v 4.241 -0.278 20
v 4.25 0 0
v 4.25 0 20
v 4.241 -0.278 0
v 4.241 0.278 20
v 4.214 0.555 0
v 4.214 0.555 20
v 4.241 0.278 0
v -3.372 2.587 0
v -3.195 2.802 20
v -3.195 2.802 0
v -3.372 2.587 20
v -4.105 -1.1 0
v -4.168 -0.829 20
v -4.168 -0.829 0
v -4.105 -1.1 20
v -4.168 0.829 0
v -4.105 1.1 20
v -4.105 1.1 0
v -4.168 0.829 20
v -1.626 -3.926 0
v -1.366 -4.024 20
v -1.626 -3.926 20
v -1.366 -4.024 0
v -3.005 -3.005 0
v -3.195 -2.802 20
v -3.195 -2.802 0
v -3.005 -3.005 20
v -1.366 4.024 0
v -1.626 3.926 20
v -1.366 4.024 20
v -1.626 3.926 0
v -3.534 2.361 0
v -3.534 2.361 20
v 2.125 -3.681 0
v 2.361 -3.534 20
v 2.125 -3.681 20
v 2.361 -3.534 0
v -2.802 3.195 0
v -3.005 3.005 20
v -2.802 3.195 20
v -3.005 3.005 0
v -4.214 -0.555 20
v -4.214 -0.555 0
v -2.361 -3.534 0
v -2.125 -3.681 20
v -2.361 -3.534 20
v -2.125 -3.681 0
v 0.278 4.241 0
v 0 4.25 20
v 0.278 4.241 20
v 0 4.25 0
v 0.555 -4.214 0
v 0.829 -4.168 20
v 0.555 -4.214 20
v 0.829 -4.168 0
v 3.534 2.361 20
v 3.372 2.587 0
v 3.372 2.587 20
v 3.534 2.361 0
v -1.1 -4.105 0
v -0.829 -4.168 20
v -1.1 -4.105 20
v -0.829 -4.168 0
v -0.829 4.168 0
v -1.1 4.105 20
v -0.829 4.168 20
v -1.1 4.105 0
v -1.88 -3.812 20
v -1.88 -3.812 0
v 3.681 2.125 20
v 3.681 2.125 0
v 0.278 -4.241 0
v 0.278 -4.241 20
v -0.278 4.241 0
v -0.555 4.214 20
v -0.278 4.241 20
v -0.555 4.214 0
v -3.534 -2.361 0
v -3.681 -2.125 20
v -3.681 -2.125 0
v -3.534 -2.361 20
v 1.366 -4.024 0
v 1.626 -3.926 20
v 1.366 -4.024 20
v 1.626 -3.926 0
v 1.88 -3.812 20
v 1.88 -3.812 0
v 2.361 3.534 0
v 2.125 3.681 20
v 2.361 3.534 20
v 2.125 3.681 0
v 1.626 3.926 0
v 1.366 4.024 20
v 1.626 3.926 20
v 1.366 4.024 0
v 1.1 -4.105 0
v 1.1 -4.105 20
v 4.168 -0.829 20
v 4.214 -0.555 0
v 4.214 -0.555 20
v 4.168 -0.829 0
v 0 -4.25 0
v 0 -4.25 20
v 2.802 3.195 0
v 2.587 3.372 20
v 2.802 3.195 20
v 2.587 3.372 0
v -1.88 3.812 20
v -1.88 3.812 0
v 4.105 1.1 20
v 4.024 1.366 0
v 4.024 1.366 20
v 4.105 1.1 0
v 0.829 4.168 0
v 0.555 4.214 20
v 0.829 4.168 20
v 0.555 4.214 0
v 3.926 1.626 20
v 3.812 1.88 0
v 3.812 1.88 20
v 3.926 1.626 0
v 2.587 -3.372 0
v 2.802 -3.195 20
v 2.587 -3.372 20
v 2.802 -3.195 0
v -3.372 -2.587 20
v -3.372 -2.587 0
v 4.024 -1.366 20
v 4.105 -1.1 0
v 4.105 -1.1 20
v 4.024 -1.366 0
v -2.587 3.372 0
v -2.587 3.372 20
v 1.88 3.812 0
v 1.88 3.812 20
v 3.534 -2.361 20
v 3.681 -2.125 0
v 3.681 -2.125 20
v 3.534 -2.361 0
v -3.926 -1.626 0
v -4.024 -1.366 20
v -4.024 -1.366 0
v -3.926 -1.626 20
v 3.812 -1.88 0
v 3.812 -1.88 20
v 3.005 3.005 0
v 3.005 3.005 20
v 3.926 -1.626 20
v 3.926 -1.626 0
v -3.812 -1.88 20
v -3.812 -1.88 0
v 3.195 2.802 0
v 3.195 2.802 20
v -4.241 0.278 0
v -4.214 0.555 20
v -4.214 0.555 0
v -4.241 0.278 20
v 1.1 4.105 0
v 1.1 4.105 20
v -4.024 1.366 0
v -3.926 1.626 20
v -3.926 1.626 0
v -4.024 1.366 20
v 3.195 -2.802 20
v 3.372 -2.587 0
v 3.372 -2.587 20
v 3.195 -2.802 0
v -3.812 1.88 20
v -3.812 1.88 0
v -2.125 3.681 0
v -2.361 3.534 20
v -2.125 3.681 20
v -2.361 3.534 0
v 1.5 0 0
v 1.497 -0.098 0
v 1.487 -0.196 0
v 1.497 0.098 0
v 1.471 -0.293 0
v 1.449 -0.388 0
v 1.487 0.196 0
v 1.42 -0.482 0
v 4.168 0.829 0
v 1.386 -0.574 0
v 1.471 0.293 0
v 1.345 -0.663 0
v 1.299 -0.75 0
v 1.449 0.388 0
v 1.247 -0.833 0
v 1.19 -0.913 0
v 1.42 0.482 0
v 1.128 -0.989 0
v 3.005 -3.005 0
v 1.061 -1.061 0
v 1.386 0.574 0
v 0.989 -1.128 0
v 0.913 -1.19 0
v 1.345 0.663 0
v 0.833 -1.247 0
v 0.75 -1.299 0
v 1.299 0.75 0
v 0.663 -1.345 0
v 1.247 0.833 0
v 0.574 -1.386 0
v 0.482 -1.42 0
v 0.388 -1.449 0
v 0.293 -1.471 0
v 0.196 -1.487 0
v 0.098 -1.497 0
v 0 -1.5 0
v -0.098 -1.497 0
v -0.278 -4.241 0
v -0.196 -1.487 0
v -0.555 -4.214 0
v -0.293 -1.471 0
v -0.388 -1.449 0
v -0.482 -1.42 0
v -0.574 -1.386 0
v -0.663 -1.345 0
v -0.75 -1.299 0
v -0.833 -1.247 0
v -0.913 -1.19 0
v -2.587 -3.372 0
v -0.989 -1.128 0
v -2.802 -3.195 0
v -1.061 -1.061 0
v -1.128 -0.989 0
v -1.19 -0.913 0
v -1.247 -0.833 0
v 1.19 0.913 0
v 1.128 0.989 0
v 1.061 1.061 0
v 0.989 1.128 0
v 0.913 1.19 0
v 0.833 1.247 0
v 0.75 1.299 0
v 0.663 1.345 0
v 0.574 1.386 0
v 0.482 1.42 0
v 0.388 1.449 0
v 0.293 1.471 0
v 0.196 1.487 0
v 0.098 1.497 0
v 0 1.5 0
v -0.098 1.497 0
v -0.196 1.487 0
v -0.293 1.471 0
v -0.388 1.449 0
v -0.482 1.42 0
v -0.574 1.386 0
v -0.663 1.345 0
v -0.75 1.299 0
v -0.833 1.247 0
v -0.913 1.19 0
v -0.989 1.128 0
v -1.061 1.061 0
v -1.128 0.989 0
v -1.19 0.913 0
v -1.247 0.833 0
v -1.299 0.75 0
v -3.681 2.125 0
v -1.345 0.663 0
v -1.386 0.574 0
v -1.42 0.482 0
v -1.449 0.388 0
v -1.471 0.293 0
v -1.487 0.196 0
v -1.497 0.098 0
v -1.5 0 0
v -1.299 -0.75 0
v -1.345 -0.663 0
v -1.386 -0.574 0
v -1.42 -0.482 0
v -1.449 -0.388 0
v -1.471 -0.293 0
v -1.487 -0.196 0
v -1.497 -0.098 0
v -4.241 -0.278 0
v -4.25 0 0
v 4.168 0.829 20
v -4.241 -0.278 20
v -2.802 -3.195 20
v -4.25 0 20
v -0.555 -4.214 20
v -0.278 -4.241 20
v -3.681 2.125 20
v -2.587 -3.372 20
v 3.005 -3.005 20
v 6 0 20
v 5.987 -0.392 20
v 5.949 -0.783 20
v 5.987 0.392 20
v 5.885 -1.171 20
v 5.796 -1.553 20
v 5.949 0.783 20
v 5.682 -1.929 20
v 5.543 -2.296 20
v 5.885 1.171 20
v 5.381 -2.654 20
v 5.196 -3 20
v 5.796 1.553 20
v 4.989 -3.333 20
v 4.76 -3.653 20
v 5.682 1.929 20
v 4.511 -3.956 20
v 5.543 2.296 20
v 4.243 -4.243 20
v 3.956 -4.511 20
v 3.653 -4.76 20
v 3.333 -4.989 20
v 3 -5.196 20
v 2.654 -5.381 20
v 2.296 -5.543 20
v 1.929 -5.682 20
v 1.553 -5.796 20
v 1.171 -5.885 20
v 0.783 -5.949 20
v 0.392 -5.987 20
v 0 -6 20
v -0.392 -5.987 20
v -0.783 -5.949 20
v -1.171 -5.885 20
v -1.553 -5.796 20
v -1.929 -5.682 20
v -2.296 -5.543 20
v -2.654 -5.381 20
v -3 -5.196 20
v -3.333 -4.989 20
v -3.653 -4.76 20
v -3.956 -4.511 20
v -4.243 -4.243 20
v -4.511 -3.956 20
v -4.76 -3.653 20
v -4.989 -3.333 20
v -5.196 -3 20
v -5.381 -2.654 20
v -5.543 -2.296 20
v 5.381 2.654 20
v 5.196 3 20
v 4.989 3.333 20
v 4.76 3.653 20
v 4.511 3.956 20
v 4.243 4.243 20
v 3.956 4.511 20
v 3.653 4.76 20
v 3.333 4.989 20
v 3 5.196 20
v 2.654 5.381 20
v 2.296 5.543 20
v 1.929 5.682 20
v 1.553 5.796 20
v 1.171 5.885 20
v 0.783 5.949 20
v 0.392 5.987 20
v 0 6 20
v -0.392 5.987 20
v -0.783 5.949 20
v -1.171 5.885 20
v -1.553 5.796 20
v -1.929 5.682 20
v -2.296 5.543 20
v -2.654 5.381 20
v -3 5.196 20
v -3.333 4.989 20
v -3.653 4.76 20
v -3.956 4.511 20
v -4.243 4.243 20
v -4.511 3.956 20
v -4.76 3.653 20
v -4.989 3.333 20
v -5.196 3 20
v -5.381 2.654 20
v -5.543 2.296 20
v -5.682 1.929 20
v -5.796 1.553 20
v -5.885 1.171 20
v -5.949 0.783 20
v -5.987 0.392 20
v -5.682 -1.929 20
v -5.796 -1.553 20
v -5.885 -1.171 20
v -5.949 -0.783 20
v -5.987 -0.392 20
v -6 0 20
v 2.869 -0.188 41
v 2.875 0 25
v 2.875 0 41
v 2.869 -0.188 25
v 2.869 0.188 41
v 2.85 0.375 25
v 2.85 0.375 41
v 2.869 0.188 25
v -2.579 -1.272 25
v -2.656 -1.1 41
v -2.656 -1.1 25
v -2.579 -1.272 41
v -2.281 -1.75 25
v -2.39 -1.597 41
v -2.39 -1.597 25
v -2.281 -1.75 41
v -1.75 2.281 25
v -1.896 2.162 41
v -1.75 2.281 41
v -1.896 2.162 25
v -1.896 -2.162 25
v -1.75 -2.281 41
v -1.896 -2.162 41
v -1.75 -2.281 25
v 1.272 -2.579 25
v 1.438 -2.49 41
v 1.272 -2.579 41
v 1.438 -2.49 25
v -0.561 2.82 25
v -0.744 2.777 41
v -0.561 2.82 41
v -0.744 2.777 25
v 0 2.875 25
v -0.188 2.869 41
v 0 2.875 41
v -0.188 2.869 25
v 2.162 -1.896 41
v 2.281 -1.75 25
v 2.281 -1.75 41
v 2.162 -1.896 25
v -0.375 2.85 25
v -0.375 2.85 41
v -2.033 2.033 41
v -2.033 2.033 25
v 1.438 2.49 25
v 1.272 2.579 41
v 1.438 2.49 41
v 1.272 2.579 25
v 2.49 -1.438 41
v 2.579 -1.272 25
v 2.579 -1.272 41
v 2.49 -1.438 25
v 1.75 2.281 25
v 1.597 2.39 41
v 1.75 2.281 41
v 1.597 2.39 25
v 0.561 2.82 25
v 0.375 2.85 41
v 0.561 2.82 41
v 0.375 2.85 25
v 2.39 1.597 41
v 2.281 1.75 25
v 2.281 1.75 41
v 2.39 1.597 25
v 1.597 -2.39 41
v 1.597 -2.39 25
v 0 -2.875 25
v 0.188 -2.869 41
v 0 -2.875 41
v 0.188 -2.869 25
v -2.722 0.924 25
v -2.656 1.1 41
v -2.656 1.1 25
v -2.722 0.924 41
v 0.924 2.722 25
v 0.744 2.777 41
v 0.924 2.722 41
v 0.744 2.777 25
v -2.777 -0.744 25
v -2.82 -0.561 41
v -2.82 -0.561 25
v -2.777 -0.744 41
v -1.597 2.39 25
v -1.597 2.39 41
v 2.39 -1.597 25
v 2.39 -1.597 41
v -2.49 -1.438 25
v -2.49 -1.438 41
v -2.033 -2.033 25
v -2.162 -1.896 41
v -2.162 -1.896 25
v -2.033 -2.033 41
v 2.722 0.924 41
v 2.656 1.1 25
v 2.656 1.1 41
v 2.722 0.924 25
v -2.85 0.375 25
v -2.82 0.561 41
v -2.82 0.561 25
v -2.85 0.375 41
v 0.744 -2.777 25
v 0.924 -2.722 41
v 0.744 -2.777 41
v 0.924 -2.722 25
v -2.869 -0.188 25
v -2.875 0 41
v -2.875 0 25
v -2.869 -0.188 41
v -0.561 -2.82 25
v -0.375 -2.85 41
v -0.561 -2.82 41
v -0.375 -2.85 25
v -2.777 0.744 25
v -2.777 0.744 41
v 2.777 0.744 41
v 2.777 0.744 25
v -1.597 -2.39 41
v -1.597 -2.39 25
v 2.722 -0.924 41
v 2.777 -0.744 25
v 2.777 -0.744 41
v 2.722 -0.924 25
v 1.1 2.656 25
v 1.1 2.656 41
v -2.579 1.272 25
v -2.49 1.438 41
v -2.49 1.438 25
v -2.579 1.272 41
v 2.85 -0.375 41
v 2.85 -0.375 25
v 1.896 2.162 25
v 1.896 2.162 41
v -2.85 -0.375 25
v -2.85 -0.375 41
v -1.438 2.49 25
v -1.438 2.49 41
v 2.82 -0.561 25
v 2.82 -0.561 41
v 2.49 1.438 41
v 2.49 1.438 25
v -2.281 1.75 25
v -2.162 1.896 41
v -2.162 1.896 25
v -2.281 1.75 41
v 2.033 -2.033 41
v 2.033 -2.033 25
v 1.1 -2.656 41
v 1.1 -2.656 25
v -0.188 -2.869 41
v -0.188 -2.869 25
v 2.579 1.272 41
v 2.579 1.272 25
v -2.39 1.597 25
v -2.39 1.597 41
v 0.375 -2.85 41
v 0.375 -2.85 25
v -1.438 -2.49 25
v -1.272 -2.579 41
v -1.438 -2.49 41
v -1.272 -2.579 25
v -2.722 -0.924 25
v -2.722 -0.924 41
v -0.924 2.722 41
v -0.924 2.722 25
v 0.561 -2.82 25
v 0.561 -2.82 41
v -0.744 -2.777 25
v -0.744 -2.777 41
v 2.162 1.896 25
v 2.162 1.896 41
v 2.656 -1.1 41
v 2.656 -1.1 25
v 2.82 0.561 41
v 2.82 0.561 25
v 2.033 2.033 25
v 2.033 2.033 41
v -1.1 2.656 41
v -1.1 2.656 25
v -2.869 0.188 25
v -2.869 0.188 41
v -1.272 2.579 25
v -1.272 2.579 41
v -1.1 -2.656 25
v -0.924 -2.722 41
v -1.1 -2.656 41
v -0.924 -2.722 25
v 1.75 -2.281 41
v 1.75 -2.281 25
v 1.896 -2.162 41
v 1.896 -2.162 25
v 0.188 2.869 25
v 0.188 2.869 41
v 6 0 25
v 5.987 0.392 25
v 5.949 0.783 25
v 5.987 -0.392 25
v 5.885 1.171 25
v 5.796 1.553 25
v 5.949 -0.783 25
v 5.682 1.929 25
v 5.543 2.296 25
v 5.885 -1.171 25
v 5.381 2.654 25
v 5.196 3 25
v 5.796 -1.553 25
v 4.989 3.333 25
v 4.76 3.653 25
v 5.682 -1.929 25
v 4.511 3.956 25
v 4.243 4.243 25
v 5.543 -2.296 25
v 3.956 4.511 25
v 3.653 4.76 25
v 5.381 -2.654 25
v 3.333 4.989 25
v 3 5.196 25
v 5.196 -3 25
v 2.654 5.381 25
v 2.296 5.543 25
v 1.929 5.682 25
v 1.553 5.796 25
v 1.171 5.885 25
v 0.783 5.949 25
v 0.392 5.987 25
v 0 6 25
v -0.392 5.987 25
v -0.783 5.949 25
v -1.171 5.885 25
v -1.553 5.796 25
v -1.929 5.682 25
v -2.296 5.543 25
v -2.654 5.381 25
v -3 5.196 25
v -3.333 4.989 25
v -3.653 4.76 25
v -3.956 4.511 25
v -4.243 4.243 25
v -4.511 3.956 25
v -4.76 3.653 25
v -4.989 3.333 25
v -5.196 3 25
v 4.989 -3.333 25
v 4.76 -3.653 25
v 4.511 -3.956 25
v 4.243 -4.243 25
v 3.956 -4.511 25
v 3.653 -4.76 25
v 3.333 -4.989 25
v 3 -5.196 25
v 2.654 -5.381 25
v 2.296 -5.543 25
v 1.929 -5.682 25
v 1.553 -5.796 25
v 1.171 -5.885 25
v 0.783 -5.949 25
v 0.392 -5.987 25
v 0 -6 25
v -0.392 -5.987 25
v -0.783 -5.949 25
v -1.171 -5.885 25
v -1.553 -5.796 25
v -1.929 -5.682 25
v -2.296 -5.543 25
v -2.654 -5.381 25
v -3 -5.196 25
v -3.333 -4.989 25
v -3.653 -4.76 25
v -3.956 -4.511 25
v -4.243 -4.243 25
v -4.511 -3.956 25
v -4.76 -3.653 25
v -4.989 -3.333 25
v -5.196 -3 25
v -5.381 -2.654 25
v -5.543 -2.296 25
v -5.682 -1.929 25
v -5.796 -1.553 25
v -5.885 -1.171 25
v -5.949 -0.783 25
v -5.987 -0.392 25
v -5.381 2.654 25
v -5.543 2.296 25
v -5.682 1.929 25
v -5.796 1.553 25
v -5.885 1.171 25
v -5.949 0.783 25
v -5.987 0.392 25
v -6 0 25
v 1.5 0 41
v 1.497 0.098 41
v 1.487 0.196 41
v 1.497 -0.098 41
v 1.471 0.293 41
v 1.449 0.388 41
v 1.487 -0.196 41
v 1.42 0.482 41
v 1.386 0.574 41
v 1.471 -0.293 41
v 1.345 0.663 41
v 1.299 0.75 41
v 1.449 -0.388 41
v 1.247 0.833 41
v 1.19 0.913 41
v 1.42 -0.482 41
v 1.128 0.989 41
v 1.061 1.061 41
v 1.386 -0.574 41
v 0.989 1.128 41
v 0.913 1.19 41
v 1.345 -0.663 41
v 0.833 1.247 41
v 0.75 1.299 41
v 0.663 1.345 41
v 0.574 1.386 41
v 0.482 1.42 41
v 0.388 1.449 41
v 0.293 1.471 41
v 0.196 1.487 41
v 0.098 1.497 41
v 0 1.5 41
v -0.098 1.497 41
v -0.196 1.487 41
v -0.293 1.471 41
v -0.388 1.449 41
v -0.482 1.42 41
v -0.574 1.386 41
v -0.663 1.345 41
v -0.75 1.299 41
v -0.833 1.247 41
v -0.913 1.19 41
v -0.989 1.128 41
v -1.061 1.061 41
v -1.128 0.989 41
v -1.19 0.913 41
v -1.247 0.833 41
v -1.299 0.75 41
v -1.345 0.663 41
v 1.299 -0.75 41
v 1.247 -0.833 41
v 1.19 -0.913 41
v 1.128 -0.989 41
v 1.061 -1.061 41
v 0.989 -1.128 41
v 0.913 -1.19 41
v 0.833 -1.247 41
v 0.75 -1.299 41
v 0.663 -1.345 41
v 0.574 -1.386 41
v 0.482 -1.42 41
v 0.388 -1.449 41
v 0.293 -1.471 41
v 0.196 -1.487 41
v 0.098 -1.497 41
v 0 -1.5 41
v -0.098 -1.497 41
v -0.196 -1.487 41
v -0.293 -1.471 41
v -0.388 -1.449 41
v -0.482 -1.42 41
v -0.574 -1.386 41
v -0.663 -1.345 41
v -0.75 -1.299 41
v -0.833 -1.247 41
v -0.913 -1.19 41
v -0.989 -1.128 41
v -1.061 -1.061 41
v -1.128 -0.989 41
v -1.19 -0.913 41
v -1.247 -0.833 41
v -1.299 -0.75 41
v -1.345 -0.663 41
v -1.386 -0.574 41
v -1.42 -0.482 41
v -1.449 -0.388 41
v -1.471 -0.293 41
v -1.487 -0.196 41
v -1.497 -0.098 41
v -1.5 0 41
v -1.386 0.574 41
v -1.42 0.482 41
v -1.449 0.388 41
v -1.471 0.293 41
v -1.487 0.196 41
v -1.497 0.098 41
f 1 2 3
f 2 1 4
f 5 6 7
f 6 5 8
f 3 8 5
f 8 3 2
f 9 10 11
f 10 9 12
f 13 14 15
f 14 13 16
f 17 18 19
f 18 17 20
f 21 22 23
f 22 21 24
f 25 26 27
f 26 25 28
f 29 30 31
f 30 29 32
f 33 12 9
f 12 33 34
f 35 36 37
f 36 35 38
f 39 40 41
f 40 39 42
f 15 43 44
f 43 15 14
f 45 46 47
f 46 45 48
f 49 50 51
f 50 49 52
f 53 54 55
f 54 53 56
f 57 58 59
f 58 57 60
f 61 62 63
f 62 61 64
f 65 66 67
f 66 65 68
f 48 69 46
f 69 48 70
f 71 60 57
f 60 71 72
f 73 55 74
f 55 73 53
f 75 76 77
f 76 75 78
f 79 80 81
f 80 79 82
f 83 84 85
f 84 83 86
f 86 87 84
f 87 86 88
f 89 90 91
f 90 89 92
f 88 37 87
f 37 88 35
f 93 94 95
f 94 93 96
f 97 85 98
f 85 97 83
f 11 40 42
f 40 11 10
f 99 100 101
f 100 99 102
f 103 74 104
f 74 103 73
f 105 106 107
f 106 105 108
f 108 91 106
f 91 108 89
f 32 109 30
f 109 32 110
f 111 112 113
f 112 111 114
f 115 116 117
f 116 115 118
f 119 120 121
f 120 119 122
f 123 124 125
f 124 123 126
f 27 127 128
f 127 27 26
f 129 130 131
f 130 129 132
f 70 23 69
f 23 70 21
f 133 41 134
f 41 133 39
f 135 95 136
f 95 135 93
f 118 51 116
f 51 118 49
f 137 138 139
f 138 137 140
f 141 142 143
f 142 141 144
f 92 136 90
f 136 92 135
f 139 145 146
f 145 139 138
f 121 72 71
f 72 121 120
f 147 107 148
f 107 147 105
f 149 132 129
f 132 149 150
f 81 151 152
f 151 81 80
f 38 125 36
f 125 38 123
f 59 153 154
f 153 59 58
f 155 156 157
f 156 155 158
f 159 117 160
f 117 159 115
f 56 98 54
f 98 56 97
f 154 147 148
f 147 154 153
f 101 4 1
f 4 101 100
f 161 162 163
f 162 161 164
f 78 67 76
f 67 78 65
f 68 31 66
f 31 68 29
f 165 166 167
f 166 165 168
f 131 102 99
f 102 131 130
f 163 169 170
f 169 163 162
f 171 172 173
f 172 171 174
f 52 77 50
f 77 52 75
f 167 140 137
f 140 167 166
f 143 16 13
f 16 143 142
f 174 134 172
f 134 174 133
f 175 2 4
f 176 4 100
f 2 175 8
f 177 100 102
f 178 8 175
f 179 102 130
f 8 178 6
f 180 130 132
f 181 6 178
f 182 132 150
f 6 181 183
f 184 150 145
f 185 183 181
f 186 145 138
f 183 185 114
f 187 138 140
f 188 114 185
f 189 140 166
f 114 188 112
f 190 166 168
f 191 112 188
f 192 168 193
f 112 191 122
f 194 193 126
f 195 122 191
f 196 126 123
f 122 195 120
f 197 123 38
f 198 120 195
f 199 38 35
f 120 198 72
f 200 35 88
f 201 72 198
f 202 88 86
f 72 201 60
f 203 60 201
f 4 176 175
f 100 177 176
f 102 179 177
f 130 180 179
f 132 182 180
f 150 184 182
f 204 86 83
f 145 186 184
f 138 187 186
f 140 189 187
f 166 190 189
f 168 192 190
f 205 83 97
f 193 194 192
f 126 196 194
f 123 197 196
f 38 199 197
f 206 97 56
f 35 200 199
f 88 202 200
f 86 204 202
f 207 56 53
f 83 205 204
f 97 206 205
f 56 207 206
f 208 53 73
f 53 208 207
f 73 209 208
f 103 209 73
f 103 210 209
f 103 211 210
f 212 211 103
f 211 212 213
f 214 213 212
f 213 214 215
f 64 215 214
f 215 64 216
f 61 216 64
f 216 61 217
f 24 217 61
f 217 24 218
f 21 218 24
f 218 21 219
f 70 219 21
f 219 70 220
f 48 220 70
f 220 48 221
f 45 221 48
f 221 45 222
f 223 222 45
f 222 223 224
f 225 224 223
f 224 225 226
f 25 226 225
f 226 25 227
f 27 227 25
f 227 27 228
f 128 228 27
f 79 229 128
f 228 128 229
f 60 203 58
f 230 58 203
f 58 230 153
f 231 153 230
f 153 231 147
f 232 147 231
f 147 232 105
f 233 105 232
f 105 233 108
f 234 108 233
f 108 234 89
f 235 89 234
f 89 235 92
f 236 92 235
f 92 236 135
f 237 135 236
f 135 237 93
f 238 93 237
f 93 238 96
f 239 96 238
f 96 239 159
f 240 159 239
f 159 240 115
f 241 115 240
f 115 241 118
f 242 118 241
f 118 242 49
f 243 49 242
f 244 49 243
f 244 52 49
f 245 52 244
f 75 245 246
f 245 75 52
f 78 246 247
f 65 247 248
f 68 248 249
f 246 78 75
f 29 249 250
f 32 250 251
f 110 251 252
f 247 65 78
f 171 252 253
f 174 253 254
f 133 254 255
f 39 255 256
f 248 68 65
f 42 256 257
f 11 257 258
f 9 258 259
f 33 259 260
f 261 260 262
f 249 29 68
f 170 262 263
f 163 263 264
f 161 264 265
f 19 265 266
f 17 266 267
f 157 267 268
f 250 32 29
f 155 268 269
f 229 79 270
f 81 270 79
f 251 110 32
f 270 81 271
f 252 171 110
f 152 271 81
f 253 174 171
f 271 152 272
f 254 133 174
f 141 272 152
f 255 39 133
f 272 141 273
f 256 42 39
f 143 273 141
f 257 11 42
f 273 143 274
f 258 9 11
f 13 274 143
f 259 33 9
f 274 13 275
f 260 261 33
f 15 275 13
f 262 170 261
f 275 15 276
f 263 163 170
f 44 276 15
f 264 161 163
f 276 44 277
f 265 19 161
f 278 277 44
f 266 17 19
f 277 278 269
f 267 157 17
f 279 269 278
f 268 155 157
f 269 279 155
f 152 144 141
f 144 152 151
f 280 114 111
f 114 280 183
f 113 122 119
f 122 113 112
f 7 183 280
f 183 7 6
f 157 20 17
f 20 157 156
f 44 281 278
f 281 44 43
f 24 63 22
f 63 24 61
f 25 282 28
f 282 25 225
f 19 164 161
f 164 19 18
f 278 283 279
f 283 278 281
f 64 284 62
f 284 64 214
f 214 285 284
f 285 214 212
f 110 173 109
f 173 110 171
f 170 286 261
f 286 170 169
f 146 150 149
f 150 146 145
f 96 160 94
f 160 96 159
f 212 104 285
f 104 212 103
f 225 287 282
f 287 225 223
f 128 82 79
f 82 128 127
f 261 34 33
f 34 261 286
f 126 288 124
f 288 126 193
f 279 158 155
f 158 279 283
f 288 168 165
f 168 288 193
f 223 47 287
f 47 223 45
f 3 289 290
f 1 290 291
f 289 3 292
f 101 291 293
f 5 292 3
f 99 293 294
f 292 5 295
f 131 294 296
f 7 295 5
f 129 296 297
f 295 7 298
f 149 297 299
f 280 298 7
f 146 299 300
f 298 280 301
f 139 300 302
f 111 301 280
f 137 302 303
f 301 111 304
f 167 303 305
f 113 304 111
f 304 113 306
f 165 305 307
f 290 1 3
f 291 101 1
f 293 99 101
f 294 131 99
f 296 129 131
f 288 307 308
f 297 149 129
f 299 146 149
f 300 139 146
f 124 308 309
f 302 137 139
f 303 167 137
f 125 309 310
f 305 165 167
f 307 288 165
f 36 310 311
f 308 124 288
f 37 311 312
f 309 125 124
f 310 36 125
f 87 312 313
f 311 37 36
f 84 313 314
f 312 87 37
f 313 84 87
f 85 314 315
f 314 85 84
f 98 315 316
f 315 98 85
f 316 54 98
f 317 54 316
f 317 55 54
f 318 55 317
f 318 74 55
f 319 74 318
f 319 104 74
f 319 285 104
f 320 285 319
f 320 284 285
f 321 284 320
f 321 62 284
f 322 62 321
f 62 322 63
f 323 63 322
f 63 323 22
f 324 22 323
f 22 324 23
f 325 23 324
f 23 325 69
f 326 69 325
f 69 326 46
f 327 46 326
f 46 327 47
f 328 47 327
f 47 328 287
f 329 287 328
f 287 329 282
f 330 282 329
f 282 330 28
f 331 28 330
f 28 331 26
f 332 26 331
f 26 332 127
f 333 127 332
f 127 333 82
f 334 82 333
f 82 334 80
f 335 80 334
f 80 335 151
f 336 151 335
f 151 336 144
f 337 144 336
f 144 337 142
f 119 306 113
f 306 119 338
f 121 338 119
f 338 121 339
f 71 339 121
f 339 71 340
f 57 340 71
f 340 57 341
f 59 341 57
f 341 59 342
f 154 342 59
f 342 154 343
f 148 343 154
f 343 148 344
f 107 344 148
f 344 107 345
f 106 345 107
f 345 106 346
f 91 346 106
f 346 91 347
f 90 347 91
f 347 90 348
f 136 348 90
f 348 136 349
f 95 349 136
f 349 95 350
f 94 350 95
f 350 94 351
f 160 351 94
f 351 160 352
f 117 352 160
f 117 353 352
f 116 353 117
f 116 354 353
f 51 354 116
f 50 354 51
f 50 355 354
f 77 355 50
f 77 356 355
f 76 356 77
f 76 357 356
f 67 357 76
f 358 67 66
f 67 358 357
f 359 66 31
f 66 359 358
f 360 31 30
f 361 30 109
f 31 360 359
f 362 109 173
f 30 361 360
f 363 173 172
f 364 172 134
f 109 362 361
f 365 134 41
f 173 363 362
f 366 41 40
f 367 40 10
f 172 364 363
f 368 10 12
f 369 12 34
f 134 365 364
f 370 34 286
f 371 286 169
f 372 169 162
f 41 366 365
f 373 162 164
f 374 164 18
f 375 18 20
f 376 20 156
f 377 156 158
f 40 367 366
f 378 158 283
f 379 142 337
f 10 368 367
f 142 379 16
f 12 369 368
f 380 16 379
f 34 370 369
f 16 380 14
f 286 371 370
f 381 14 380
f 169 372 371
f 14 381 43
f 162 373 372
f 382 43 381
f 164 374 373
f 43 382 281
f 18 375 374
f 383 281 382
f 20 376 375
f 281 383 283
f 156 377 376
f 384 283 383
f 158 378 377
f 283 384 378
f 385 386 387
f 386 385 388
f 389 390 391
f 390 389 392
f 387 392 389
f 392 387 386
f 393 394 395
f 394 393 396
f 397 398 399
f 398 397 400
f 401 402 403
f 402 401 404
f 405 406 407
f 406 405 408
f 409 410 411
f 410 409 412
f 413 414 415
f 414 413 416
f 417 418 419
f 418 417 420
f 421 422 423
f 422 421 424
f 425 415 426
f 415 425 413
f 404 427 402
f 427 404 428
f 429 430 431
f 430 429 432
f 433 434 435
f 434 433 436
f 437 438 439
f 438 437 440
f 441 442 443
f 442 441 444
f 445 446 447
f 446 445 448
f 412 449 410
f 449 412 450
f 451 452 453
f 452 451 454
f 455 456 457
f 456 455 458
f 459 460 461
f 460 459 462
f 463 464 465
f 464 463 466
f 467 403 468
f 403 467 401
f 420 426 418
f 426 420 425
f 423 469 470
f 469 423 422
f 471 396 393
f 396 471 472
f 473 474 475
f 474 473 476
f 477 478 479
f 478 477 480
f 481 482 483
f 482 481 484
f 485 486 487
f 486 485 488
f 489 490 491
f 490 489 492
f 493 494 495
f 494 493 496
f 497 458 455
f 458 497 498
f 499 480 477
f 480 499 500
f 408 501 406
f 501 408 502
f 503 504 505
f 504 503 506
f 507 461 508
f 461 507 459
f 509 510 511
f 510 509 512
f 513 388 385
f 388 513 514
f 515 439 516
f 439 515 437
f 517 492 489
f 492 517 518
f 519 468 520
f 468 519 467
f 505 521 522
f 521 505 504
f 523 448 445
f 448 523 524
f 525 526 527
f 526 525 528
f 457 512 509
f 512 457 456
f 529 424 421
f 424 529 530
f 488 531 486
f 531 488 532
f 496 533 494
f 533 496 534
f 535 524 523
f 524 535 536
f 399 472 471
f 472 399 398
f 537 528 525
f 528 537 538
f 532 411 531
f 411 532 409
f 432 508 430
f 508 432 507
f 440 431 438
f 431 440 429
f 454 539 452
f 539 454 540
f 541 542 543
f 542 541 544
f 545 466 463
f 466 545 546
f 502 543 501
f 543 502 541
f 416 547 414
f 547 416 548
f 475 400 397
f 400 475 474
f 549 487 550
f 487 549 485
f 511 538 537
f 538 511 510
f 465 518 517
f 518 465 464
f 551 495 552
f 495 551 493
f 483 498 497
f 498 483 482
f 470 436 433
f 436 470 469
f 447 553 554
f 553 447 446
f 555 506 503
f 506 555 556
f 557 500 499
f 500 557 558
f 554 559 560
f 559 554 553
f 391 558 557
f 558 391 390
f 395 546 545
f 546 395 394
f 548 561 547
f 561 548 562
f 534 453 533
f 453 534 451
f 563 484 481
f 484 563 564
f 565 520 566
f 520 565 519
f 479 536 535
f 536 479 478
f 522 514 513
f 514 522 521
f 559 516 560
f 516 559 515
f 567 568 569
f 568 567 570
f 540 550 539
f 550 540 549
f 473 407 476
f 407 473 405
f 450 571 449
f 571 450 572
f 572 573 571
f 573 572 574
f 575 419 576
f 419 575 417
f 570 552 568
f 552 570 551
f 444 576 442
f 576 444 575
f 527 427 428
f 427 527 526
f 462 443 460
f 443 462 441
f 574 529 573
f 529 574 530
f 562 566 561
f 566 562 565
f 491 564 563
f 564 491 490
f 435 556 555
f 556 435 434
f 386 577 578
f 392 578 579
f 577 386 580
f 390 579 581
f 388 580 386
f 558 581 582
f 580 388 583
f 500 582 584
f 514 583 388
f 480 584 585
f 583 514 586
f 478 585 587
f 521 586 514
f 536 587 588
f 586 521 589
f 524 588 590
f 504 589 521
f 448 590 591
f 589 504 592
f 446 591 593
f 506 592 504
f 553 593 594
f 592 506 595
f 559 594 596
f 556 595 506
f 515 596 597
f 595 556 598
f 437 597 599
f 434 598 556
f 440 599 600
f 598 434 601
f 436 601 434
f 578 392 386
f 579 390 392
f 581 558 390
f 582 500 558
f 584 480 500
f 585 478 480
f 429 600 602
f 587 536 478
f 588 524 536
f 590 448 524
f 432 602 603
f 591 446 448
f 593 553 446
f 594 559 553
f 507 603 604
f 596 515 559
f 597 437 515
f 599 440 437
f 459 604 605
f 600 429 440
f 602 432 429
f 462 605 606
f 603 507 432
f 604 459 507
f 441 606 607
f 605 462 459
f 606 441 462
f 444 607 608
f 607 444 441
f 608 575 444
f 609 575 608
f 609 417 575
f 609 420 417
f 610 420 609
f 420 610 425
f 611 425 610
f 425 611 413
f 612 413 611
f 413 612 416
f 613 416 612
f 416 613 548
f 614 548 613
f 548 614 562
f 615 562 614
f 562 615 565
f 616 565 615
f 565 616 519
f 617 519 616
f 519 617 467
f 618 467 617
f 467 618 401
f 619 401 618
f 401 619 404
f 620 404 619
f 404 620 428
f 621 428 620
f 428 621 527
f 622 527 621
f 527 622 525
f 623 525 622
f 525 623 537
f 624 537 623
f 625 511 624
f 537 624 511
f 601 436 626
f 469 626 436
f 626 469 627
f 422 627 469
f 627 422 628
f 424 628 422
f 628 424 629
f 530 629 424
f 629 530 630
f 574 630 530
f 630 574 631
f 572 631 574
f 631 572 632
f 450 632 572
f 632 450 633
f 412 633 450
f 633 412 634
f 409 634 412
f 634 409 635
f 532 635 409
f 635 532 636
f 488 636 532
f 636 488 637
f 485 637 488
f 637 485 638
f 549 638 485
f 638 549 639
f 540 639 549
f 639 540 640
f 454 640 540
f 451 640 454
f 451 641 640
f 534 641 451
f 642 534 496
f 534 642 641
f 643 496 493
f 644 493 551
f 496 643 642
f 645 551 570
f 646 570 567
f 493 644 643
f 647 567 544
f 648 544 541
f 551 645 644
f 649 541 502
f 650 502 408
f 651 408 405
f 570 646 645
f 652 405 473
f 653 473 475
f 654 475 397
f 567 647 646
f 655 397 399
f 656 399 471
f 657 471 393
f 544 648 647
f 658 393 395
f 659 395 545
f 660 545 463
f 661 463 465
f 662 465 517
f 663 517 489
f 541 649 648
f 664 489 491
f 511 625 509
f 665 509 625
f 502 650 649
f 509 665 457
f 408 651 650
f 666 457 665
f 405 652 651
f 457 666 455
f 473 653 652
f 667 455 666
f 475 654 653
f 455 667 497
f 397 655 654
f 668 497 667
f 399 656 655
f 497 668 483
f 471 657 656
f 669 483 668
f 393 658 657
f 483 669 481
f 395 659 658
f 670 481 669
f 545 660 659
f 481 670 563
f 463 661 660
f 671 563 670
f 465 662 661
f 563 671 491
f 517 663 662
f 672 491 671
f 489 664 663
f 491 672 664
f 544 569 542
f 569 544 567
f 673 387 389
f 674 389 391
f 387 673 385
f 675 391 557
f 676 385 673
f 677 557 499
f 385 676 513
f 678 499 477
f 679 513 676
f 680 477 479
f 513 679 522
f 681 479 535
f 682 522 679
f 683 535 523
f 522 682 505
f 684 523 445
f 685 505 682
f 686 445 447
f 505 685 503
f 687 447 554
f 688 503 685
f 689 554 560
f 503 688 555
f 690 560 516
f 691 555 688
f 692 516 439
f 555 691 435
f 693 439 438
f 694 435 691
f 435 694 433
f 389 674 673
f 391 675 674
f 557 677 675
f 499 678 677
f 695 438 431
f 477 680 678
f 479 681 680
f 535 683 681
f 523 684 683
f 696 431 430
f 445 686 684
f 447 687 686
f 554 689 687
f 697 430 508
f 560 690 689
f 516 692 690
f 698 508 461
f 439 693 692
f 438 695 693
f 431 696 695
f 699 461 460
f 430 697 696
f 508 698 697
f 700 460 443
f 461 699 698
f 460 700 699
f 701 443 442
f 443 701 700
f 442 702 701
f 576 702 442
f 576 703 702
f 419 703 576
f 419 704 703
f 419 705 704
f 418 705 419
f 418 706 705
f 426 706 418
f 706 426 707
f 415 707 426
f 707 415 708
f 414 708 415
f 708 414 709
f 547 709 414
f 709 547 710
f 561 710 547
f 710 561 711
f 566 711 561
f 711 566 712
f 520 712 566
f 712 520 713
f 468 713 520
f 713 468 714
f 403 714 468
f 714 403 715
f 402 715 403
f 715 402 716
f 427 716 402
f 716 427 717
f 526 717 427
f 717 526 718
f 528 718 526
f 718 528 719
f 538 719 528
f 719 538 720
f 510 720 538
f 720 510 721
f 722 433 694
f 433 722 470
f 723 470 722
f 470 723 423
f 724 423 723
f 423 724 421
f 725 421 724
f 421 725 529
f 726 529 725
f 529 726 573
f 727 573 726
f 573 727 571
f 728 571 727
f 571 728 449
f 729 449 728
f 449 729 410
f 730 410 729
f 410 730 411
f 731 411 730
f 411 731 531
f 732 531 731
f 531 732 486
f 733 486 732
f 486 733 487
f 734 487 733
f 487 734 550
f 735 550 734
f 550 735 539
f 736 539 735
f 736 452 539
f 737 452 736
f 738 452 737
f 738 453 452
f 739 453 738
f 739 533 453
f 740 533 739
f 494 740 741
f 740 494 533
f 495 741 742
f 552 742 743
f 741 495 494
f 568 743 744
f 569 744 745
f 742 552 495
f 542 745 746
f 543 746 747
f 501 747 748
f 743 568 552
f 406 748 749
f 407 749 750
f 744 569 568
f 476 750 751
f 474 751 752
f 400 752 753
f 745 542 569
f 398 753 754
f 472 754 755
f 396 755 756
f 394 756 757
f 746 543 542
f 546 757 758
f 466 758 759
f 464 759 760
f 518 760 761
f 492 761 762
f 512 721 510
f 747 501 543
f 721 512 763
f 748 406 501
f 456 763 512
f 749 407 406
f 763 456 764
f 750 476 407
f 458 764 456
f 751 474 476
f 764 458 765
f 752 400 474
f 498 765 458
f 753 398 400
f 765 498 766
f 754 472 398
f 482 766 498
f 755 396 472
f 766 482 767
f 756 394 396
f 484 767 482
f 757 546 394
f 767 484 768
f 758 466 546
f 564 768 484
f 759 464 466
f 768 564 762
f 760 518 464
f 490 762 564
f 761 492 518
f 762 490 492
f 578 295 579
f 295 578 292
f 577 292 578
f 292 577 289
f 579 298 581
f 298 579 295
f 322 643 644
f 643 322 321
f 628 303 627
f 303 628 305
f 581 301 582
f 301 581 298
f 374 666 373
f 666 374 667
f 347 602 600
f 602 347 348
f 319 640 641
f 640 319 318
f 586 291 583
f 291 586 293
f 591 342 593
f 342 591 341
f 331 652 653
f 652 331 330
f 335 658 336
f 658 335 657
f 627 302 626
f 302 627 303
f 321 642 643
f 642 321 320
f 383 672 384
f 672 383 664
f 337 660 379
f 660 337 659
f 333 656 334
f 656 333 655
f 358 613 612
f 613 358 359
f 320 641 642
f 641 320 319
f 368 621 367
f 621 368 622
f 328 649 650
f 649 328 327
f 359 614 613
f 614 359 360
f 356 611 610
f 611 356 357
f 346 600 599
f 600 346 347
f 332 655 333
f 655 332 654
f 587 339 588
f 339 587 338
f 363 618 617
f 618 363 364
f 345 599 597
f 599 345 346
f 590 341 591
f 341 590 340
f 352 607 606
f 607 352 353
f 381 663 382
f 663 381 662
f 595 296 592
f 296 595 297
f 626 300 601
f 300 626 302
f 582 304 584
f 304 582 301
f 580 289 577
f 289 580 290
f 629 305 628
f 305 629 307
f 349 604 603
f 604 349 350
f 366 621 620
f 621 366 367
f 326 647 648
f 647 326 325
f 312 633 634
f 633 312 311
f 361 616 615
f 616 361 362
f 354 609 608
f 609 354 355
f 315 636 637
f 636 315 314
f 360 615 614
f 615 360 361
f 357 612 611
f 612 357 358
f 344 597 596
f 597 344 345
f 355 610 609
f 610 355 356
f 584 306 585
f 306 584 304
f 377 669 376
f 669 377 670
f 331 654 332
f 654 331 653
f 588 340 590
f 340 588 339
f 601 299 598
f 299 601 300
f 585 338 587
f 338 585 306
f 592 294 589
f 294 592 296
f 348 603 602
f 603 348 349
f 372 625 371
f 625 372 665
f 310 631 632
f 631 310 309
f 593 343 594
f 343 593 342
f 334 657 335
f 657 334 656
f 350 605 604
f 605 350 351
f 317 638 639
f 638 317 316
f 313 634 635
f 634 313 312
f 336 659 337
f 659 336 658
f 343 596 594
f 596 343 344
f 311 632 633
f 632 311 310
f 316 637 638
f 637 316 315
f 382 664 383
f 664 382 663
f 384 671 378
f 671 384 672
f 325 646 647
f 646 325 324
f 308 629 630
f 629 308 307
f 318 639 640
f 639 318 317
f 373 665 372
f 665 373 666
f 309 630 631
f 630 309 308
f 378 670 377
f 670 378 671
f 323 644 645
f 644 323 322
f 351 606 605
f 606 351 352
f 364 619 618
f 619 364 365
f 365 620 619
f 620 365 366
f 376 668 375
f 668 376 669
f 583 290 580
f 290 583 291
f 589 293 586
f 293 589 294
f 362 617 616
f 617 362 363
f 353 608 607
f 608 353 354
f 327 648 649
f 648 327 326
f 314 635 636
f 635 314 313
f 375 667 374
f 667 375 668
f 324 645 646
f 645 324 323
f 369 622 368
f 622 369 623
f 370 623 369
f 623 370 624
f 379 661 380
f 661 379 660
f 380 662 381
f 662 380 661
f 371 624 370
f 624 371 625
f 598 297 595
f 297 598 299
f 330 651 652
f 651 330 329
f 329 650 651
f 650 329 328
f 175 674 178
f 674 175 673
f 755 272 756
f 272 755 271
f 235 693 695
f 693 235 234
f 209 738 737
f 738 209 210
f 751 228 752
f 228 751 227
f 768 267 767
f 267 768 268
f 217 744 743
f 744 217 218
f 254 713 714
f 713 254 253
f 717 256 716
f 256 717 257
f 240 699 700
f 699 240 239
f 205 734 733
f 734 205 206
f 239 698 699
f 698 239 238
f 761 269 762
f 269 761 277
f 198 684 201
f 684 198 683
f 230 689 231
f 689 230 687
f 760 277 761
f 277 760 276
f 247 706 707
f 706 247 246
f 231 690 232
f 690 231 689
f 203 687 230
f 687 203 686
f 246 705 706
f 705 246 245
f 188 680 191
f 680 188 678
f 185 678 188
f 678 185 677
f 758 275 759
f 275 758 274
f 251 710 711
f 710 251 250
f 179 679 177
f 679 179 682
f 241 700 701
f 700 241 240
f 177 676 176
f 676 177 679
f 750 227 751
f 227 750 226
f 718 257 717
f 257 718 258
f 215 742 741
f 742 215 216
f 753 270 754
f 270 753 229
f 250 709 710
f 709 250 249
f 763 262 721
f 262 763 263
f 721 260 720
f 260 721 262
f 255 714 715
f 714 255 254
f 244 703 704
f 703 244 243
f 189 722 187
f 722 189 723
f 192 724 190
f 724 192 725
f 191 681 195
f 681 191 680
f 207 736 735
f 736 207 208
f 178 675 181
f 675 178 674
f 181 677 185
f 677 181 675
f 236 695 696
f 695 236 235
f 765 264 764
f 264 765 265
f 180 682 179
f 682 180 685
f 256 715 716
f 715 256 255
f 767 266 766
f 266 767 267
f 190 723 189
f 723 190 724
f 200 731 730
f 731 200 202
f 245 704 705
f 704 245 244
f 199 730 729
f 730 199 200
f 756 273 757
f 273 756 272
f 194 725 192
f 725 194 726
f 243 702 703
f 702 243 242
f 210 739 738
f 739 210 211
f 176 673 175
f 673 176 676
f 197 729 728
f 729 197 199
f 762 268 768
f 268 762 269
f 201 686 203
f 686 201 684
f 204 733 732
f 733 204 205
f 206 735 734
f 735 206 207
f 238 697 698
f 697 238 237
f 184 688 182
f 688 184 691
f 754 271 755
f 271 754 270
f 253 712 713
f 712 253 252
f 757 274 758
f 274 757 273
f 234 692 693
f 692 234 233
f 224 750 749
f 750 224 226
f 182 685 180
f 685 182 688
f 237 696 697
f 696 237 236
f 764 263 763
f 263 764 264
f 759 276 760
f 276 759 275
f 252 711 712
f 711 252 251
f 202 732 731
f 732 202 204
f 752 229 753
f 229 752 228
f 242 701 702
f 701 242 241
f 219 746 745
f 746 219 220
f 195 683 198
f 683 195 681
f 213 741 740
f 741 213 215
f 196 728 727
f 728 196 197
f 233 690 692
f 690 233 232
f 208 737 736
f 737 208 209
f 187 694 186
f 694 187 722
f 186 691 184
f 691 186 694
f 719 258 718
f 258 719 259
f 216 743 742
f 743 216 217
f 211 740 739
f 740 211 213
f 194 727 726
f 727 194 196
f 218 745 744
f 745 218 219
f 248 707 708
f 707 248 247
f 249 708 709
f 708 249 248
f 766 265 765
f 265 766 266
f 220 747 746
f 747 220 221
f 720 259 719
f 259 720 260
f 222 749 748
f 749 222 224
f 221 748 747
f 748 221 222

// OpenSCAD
// Hose-barb reducer: joins 8 mm ID silicone tubing to 5 mm ID silicone tubing
// Print orientation: standing upright along +Z, base on XY plane (z = 0)
// Bore: 3 mm through full length
// Note: The two tubing barbs do not touch each other along Z.

// ---------------- Parameters ----------------
reducer_id      = 8;    // inner diameter of the larger (8 mm) tubing
reducer_id2     = 5;    // inner diameter of the smaller (5 mm) tubing
bore            = 3;    // through-bore diameter
barb_height1    = 10;   // height of each 8 mm tubing barb
barb_height2    = 8;    // height of each 5 mm tubing barb
barb_d1_bottom  = 7.5;  // outer diameter of 8 mm barb at its bottom
barb_d1_top     = 9.5;  // outer diameter of 8 mm barb at its top
barb_d2_bottom  = 6.5;  // outer diameter of 5 mm barb at its bottom
barb_d2_top     = 5.0;  // outer diameter of 5 mm barb at its top
collar_d        = 12;   // diameter of the cylindrical collar between the two stacks
eps             = 0.5;  // overcut so cutting shapes pass beyond the faces they cut

$fn = 96;               // smoothness of curved surfaces

// ---------------- Derived ----------------
// Lengths of the stack sections
stack1_len = 20;         // z = 0 to z = 20: two 8 mm barbs
stack2_len = 16;         // z = 25 to z = 41: two 5 mm barbs
collar_len = 5;          // z = 20 to z = 25: collar

// Barb outer diameters at a given height, using linear growth/shrinkage
function barb_d1(h) = barb_d1_bottom + (barb_d1_top - barb_d1_bottom) * h / barb_height1;
function barb_d2(h) = barb_d2_bottom + (barb_d2_top - barb_d2_bottom) * h / barb_height2;

// ---------------- Model ----------------
difference() {
    union() {
        // Stack 1: two identical 8 mm tubing barbs, stacked z = 0 to z = 20
        for (i = [0, 1]) {
            translate([0, 0, i * barb_height1])
                cylinder(h = barb_height1, d = barb_d1(barb_height1 / 2));
        }

        // Collar: cylinder of 12 mm diameter, z = 20 to z = 25
        translate([0, 0, stack1_len])
            cylinder(h = collar_len, d = collar_d);

        // Stack 2: two identical 5 mm tubing barbs, stacked z = 25 to z = 41
        for (i = [0, 1]) {
            translate([0, 0, stack1_len + collar_len + i * barb_height2])
                cylinder(h = barb_height2, d = barb_d2(barb_height2 / 2));
        }
    }

    // Through-bore: 3 mm diameter, full length (z = 0 to z = 41)
    translate([0, 0, -eps])
        cylinder(h = stack1_len + collar_len + stack2_len + 2 * eps, d = bore);
}
